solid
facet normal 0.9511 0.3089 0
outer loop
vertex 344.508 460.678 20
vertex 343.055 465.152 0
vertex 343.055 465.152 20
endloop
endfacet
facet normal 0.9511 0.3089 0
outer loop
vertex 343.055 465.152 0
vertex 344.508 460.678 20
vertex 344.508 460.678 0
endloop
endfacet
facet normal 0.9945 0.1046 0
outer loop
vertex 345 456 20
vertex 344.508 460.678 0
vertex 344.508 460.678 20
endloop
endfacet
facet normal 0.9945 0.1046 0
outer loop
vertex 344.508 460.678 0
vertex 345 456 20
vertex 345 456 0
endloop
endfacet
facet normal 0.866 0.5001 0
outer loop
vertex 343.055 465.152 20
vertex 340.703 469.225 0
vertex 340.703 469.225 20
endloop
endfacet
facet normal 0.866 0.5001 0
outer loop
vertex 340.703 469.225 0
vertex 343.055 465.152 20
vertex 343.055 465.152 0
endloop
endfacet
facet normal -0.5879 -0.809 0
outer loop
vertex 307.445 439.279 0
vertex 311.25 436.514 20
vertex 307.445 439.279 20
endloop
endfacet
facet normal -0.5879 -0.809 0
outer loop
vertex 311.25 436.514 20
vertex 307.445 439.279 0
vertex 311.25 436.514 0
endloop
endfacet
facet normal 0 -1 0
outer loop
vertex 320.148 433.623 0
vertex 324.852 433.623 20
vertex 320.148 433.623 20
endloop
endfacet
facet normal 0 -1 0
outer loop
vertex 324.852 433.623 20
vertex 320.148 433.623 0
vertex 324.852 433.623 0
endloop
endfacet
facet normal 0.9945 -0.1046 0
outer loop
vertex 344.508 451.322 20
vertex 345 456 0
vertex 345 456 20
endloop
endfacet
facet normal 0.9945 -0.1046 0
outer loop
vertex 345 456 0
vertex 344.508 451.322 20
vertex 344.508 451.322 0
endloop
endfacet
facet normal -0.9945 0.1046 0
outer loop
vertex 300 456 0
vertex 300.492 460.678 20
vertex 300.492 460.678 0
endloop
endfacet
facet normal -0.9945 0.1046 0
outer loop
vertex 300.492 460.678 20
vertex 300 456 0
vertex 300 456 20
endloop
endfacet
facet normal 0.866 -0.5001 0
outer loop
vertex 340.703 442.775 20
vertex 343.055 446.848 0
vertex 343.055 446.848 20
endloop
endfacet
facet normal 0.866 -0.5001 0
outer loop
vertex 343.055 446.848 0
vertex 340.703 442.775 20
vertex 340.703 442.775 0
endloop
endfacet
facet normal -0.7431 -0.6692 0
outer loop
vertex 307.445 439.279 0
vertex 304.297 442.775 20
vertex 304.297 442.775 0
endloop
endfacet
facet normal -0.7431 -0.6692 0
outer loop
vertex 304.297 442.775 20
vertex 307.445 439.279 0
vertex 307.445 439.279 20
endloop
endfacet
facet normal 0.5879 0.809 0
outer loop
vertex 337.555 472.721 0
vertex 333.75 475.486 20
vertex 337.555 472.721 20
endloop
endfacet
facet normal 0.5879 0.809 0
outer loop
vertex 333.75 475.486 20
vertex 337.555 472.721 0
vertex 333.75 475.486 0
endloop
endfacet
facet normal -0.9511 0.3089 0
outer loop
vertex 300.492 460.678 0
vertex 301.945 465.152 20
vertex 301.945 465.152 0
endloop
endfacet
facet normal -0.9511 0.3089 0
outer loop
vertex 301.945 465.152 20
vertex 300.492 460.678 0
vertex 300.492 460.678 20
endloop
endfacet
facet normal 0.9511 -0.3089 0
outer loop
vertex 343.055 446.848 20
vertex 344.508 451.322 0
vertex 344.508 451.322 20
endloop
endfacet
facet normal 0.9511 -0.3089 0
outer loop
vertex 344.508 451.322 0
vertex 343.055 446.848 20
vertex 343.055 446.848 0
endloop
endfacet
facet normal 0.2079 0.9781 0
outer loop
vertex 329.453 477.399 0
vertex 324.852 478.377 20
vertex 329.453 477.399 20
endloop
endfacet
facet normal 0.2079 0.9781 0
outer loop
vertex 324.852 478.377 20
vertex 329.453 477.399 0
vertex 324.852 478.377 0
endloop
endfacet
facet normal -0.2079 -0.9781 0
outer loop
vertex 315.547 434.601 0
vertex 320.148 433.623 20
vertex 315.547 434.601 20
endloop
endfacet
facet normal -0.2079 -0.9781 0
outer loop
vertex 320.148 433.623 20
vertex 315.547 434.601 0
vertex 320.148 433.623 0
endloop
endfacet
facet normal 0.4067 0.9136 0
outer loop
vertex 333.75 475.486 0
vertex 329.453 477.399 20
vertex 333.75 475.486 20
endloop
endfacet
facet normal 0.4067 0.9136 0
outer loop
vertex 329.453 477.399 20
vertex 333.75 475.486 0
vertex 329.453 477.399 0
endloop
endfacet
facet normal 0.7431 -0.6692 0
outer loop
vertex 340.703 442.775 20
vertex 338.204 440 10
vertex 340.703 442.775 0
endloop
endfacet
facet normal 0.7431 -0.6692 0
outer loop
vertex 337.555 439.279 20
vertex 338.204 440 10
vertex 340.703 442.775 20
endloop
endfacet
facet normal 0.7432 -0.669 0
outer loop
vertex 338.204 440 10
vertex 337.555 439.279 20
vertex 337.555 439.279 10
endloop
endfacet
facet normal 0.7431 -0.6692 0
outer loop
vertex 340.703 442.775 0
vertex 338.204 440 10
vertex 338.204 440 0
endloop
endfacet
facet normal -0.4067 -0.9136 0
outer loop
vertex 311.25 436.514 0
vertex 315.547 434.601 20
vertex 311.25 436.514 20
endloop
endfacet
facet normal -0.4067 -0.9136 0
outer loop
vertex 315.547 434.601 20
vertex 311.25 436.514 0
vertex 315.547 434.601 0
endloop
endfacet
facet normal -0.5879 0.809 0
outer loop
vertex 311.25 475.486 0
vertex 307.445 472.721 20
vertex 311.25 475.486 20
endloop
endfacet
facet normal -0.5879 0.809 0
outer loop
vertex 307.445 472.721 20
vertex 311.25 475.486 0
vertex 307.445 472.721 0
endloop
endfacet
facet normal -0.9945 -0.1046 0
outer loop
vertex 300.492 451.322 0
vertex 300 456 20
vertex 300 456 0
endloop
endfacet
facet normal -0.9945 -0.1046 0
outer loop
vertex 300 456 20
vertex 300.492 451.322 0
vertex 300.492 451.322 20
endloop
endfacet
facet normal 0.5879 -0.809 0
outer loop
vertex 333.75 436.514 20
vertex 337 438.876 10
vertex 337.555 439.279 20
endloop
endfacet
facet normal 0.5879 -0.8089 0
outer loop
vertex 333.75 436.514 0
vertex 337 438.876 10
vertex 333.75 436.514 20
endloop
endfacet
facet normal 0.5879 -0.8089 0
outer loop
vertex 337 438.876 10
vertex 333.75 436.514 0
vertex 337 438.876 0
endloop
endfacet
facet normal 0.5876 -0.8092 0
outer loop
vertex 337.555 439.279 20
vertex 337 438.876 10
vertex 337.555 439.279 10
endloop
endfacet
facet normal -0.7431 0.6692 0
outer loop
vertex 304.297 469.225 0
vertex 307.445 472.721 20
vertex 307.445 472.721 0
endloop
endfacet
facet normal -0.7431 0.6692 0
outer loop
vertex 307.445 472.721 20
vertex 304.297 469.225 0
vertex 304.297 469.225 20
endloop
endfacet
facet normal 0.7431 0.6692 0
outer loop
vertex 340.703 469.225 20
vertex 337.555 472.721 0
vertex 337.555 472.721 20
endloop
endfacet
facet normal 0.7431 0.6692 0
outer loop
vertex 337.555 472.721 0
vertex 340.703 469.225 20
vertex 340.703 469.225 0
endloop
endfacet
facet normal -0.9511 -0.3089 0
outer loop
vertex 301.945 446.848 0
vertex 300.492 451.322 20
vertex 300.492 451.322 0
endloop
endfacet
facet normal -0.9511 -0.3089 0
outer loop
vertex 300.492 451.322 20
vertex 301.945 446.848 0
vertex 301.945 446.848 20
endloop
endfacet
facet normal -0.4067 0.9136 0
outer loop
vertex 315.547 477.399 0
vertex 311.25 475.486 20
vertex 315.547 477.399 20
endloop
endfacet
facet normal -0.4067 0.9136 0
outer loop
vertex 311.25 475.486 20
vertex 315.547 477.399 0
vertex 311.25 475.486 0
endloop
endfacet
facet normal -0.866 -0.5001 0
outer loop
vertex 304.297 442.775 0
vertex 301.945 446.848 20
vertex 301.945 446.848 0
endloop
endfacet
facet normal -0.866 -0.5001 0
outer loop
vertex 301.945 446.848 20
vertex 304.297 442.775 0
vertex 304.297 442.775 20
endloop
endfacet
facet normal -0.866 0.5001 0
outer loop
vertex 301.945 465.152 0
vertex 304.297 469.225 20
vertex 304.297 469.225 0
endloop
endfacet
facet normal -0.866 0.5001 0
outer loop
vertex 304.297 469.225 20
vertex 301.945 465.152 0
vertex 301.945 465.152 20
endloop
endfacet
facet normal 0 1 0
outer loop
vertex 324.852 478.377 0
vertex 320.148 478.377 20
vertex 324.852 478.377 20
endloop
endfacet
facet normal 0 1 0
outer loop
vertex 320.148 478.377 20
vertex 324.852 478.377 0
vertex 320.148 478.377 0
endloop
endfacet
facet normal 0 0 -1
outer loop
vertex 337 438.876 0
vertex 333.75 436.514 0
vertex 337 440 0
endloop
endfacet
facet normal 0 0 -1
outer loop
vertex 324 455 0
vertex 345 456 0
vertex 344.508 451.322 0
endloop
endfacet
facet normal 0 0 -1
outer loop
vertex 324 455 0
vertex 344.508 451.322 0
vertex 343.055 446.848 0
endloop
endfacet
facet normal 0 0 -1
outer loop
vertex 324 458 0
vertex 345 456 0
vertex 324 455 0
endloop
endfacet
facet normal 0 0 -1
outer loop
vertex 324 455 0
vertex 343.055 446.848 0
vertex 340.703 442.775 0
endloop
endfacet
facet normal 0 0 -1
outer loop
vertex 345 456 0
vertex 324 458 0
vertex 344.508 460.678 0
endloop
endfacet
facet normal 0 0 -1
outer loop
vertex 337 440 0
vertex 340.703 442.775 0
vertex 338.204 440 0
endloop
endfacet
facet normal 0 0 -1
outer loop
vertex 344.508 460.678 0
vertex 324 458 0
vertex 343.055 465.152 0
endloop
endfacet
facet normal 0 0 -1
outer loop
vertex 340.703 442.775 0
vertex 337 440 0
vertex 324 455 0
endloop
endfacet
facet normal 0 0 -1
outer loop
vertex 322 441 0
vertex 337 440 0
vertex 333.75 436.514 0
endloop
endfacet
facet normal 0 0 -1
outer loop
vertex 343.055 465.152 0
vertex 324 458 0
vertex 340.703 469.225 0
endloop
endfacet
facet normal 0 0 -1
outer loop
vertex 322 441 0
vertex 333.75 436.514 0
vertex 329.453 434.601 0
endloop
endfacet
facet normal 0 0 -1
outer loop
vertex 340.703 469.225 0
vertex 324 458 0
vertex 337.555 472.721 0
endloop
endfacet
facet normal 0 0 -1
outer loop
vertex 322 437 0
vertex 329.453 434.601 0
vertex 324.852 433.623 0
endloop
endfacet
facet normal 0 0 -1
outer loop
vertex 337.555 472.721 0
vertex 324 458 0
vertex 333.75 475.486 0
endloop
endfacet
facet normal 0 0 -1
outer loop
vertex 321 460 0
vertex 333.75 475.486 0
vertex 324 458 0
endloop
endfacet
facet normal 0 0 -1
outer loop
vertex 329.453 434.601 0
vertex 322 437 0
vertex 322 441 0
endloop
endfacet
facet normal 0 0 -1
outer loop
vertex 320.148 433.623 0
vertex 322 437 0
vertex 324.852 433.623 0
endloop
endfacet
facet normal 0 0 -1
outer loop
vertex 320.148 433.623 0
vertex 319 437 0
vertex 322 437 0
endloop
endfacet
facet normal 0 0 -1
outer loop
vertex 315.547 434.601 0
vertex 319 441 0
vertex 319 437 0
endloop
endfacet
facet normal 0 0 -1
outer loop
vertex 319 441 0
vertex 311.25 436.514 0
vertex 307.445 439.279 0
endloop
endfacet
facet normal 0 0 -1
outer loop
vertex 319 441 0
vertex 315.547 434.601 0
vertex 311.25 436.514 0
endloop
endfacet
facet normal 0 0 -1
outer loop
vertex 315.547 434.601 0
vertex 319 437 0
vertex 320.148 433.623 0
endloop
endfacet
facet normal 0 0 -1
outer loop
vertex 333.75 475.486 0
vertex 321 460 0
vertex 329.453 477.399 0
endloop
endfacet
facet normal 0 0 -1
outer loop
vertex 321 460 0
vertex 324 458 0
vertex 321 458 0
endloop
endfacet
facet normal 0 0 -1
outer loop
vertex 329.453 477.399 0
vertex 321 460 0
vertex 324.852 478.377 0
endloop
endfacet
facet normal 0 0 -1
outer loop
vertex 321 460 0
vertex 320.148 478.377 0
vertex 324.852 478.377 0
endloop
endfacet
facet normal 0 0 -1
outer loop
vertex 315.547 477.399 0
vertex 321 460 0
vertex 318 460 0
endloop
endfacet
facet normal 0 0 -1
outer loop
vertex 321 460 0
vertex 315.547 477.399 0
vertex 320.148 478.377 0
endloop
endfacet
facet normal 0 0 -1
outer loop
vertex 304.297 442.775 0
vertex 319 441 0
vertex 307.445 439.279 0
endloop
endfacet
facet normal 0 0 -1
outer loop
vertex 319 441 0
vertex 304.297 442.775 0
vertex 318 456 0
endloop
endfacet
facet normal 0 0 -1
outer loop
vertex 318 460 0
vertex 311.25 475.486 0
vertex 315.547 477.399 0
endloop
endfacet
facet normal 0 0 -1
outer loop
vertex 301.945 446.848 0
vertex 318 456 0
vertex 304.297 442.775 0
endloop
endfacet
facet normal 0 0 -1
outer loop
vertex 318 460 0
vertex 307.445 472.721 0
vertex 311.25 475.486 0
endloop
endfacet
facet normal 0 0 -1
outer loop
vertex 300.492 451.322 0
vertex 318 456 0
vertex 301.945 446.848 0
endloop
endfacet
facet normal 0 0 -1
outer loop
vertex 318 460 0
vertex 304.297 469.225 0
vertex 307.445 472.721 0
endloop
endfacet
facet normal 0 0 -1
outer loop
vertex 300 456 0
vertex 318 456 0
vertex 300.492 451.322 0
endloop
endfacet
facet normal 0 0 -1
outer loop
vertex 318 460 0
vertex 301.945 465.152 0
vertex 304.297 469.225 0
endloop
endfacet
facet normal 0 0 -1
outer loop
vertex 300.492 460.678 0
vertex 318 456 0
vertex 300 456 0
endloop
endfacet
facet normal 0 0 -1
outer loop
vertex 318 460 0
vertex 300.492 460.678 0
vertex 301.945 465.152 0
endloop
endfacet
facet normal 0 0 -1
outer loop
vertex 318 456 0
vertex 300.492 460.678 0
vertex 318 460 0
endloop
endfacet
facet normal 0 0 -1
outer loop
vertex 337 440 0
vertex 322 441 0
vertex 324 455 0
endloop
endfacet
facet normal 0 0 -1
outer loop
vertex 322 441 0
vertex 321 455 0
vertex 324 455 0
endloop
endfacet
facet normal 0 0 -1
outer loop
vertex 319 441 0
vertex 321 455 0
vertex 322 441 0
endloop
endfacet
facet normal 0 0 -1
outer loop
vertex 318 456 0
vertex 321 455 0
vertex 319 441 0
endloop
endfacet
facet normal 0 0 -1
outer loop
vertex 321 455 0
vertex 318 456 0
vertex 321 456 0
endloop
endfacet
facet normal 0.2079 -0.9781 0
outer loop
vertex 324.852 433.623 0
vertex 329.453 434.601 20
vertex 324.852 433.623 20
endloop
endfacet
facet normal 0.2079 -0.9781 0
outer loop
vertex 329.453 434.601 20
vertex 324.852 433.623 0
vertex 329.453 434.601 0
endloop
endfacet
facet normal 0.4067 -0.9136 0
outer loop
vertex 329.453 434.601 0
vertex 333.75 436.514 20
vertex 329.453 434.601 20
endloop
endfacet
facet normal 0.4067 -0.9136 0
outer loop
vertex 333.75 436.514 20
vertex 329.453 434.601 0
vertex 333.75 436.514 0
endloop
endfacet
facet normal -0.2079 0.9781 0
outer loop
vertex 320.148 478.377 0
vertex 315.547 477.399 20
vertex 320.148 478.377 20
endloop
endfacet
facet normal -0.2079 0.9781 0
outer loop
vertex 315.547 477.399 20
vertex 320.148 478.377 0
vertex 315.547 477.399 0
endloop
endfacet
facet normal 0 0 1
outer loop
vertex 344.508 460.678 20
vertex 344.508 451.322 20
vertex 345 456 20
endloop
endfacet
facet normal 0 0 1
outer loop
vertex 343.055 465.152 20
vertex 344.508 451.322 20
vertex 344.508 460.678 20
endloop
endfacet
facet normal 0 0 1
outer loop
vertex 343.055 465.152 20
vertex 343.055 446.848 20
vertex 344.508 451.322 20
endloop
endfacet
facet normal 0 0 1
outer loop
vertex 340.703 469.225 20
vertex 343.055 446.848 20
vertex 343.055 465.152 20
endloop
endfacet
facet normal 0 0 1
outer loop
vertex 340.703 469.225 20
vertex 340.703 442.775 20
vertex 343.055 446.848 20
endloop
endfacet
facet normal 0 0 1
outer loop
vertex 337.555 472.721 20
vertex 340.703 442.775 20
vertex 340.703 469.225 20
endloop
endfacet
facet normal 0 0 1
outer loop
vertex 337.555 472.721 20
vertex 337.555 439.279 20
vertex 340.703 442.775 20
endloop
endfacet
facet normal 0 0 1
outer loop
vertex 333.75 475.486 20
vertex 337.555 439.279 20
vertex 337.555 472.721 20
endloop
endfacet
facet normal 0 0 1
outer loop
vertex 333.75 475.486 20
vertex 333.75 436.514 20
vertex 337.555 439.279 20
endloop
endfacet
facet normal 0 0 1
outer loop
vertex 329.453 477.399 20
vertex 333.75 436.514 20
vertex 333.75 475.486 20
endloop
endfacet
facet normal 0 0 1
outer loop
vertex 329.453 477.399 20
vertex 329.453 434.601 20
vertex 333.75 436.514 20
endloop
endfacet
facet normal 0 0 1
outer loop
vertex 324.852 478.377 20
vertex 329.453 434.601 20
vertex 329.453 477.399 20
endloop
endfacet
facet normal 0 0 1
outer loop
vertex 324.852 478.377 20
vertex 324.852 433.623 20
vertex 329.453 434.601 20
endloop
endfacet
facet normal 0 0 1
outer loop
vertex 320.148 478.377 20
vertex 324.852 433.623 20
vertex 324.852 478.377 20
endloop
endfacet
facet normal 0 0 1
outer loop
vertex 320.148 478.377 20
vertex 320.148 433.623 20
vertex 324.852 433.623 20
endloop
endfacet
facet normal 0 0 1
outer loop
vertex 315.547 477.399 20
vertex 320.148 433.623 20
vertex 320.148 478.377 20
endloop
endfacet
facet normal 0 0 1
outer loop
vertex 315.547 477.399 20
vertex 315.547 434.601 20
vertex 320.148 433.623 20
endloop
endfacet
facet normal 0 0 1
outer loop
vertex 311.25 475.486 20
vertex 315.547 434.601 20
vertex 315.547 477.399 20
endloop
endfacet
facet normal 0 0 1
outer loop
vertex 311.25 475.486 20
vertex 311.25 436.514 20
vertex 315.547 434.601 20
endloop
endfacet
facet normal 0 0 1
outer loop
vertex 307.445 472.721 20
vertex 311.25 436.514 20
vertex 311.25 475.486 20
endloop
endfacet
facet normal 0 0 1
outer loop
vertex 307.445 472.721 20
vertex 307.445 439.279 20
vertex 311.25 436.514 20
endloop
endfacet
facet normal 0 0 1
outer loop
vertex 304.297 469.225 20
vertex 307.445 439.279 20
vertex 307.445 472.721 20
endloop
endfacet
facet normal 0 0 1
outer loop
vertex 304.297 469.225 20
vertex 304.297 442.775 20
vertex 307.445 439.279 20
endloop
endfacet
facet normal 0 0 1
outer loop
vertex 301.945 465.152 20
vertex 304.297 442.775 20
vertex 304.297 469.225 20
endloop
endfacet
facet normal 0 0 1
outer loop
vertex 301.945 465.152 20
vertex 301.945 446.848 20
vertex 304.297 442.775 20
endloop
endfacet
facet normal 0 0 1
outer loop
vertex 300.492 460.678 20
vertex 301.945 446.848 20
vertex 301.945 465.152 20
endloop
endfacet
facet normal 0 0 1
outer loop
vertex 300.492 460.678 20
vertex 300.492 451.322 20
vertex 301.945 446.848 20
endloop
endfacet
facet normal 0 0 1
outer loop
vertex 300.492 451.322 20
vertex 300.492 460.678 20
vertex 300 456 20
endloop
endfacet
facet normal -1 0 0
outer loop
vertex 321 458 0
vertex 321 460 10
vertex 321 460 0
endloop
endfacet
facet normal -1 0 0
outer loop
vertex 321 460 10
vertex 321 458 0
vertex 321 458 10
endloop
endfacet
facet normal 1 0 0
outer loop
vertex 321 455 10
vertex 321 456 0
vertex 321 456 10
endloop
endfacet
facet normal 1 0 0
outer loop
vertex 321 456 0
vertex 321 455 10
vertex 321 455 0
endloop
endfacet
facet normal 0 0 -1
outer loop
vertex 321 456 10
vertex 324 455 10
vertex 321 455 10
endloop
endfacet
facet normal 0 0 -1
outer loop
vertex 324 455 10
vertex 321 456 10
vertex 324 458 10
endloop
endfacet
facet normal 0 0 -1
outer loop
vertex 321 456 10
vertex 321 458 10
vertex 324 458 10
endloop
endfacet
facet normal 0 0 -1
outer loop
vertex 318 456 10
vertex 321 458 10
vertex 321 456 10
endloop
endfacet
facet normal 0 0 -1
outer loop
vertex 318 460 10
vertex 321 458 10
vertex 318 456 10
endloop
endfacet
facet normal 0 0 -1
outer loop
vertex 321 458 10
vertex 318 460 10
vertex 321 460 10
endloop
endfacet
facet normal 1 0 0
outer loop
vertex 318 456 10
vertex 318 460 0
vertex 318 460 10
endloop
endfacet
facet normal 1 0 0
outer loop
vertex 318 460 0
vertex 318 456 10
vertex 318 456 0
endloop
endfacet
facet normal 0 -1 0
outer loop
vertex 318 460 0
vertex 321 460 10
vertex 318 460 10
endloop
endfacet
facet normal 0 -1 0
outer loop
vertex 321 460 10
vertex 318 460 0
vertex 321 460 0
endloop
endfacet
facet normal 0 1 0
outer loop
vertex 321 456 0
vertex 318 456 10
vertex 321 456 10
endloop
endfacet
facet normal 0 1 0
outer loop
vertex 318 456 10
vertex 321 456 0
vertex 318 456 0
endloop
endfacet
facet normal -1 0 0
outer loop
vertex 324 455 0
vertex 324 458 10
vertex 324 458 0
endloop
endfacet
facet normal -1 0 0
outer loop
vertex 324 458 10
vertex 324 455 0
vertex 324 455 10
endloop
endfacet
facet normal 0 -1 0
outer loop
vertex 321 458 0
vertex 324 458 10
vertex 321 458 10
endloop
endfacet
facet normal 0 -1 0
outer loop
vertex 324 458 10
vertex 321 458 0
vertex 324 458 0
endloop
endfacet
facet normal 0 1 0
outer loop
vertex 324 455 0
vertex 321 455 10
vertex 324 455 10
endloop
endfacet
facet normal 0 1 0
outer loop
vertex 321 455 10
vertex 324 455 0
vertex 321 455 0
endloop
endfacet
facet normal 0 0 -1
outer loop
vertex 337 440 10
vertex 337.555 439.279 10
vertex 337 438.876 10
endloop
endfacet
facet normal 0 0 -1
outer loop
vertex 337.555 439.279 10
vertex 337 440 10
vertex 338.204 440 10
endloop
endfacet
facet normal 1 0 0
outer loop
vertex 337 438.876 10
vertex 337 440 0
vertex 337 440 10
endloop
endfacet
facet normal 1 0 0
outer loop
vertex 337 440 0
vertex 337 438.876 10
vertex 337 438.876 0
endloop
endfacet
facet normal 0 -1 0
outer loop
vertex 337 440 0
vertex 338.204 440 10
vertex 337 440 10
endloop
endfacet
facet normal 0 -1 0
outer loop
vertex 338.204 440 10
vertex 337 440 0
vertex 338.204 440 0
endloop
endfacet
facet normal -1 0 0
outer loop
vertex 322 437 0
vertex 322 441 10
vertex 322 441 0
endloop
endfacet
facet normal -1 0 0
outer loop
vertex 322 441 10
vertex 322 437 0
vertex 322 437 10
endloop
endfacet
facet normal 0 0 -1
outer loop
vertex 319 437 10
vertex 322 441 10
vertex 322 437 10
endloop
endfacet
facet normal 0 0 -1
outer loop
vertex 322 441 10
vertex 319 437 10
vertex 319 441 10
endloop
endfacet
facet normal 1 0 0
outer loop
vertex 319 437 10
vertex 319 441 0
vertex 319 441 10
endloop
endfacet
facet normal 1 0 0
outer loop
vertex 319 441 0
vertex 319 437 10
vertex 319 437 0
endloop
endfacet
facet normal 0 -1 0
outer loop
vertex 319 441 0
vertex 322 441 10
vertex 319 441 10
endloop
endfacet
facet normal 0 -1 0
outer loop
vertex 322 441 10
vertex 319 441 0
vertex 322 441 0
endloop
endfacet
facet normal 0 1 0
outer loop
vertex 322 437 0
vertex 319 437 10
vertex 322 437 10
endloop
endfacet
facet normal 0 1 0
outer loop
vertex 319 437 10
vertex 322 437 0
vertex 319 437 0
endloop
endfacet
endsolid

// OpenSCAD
difference(){
    translate(v=[322.5, 456.0, 0]){
        cylinder(h=20, d=45);
    };
    translate(v=[318, 456, 0]){
        cube(size=[3, 4, 10]);
    };
    translate(v=[321, 455, 0]){
        cube(size=[3, 3, 10]);
    };
    translate(v=[288.0, 456.0, 0]){
        cylinder(h=20, d=12);
    };
    translate(v=[229.0, 457.0, 0]){
        cylinder(h=20, d=90);
    };
    translate(v=[92.5, 454.5, 0]){
        cylinder(h=20, d=185);
    };
    translate(v=[134, 457, 0]){
        cube(size=[4, 3, 10]);
    };
    translate(v=[155, 456, 0]){
        cube(size=[3, 3, 10]);
    };
    translate(v=[135, 456, 0]){
        cube(size=[4, 3, 10]);
    };
    translate(v=[110, 456, 0]){
        cube(size=[3, 4, 10]);
    };
    translate(v=[134, 455, 0]){
        cube(size=[4, 3, 10]);
    };
    translate(v=[337, 436, 0]){
        cube(size=[3, 4, 10]);
    };
    translate(v=[319, 437, 0]){
        cube(size=[3, 4, 10]);
    };
    translate(v=[268.5, 438.0, 0]){
        cylinder(h=20, d=19);
    };
    translate(v=[20.0, 439.0, 0]){
        cylinder(h=20, d=40);
    };
    translate(v=[20, 436, 0]){
        cube(size=[4, 4, 10]);
    };
    translate(v=[55, 435, 0]){
        cube(size=[3, 3, 10]);
    };
    translate(v=[161, 436, 0]){
        cube(size=[4, 4, 10]);
    };
    translate(v=[108, 433, 0]){
        cube(size=[3, 3, 10]);
    };
    translate(v=[129, 419, 0]){
        cube(size=[3, 3, 10]);
    };
    translate(v=[92, 418, 0]){
        cube(size=[3, 3, 10]);
    };
    translate(v=[6, 416, 0]){
        cube(size=[4, 3, 10]);
    };
    translate(v=[235, 397, 0]){
        cube(size=[3, 3, 10]);
    };
    translate(v=[318.0, 362.0, 0]){
        cylinder(h=20, d=8);
    };
    translate(v=[203, 351, 0]){
        cube(size=[6, 7, 10]);
    };
    translate(v=[153, 350, 0]){
        cube(size=[7, 5, 10]);
    };
    translate(v=[219.5, 354.5, 0]){
        cylinder(h=20, d=13);
    };
    translate(v=[263, 314, 0]){
        cube(size=[6, 6, 10]);
    };
    translate(v=[74, 114, 0]){
        cube(size=[160, 216, 10]);
    };
    translate(v=[141.5, 302.5, 0]){
        cylinder(h=20, d=9);
    };
    translate(v=[178, 285, 0]){
        cube(size=[22, 20, 10]);
    };
    translate(v=[95, 281, 0]){
        cube(size=[23, 20, 10]);
    };
    translate(v=[171.5, 222.0, 0]){
        cylinder(h=20, d=3);
    };
    translate(v=[185.5, 181.0, 0]){
        cylinder(h=20, d=11);
    };
    translate(v=[166.0, 179.5, 0]){
        cylinder(h=20, d=4);
    };
    translate(v=[190, 142, 0]){
        cube(size=[18, 19, 10]);
    };
    translate(v=[102, 142, 0]){
        cube(size=[17, 20, 10]);
    };
    translate(v=[134.0, 99.0, 0]){
        cylinder(h=20, d=10);
    };
    translate(v=[134, 96, 0]){
        cube(size=[4, 4, 10]);
    };
    translate(v=[85, 94, 0]){
        cube(size=[3, 3, 10]);
    };
    translate(v=[212.5, 75.0, 0]){
        cylinder(h=20, d=9);
    };
    translate(v=[326, 50, 0]){
        cube(size=[5, 6, 10]);
    };
    translate(v=[237, 50, 0]){
        cube(size=[7, 5, 10]);
    };
    translate(v=[95.5, 52.5, 0]){
        cylinder(h=20, d=9);
    };
    translate(v=[160.0, 30.0, 0]){
        cylinder(h=20, d=8);
    };
    translate(v=[0, 27, 0]){
        cube(size=[7, 8, 10]);
    };
    translate(v=[283, 26, 0]){
        cube(size=[4, 4, 10]);
    };
    translate(v=[182.0, 27.5, 0]){
        cylinder(h=20, d=10);
    };
    translate(v=[89.5, 28.5, 0]){
        cylinder(h=20, d=11);
    };
    translate(v=[141.5, 8.5, 0]){
        cylinder(h=20, d=283);
    };
    translate(v=[11, 8, 0]){
        cube(size=[3, 3, 10]);
    };
    translate(v=[316.5, 6.5, 0]){
        cylinder(h=20, d=31);
    };
    translate(v=[321, 2, 0]){
        cube(size=[3, 3, 10]);
    };
};
